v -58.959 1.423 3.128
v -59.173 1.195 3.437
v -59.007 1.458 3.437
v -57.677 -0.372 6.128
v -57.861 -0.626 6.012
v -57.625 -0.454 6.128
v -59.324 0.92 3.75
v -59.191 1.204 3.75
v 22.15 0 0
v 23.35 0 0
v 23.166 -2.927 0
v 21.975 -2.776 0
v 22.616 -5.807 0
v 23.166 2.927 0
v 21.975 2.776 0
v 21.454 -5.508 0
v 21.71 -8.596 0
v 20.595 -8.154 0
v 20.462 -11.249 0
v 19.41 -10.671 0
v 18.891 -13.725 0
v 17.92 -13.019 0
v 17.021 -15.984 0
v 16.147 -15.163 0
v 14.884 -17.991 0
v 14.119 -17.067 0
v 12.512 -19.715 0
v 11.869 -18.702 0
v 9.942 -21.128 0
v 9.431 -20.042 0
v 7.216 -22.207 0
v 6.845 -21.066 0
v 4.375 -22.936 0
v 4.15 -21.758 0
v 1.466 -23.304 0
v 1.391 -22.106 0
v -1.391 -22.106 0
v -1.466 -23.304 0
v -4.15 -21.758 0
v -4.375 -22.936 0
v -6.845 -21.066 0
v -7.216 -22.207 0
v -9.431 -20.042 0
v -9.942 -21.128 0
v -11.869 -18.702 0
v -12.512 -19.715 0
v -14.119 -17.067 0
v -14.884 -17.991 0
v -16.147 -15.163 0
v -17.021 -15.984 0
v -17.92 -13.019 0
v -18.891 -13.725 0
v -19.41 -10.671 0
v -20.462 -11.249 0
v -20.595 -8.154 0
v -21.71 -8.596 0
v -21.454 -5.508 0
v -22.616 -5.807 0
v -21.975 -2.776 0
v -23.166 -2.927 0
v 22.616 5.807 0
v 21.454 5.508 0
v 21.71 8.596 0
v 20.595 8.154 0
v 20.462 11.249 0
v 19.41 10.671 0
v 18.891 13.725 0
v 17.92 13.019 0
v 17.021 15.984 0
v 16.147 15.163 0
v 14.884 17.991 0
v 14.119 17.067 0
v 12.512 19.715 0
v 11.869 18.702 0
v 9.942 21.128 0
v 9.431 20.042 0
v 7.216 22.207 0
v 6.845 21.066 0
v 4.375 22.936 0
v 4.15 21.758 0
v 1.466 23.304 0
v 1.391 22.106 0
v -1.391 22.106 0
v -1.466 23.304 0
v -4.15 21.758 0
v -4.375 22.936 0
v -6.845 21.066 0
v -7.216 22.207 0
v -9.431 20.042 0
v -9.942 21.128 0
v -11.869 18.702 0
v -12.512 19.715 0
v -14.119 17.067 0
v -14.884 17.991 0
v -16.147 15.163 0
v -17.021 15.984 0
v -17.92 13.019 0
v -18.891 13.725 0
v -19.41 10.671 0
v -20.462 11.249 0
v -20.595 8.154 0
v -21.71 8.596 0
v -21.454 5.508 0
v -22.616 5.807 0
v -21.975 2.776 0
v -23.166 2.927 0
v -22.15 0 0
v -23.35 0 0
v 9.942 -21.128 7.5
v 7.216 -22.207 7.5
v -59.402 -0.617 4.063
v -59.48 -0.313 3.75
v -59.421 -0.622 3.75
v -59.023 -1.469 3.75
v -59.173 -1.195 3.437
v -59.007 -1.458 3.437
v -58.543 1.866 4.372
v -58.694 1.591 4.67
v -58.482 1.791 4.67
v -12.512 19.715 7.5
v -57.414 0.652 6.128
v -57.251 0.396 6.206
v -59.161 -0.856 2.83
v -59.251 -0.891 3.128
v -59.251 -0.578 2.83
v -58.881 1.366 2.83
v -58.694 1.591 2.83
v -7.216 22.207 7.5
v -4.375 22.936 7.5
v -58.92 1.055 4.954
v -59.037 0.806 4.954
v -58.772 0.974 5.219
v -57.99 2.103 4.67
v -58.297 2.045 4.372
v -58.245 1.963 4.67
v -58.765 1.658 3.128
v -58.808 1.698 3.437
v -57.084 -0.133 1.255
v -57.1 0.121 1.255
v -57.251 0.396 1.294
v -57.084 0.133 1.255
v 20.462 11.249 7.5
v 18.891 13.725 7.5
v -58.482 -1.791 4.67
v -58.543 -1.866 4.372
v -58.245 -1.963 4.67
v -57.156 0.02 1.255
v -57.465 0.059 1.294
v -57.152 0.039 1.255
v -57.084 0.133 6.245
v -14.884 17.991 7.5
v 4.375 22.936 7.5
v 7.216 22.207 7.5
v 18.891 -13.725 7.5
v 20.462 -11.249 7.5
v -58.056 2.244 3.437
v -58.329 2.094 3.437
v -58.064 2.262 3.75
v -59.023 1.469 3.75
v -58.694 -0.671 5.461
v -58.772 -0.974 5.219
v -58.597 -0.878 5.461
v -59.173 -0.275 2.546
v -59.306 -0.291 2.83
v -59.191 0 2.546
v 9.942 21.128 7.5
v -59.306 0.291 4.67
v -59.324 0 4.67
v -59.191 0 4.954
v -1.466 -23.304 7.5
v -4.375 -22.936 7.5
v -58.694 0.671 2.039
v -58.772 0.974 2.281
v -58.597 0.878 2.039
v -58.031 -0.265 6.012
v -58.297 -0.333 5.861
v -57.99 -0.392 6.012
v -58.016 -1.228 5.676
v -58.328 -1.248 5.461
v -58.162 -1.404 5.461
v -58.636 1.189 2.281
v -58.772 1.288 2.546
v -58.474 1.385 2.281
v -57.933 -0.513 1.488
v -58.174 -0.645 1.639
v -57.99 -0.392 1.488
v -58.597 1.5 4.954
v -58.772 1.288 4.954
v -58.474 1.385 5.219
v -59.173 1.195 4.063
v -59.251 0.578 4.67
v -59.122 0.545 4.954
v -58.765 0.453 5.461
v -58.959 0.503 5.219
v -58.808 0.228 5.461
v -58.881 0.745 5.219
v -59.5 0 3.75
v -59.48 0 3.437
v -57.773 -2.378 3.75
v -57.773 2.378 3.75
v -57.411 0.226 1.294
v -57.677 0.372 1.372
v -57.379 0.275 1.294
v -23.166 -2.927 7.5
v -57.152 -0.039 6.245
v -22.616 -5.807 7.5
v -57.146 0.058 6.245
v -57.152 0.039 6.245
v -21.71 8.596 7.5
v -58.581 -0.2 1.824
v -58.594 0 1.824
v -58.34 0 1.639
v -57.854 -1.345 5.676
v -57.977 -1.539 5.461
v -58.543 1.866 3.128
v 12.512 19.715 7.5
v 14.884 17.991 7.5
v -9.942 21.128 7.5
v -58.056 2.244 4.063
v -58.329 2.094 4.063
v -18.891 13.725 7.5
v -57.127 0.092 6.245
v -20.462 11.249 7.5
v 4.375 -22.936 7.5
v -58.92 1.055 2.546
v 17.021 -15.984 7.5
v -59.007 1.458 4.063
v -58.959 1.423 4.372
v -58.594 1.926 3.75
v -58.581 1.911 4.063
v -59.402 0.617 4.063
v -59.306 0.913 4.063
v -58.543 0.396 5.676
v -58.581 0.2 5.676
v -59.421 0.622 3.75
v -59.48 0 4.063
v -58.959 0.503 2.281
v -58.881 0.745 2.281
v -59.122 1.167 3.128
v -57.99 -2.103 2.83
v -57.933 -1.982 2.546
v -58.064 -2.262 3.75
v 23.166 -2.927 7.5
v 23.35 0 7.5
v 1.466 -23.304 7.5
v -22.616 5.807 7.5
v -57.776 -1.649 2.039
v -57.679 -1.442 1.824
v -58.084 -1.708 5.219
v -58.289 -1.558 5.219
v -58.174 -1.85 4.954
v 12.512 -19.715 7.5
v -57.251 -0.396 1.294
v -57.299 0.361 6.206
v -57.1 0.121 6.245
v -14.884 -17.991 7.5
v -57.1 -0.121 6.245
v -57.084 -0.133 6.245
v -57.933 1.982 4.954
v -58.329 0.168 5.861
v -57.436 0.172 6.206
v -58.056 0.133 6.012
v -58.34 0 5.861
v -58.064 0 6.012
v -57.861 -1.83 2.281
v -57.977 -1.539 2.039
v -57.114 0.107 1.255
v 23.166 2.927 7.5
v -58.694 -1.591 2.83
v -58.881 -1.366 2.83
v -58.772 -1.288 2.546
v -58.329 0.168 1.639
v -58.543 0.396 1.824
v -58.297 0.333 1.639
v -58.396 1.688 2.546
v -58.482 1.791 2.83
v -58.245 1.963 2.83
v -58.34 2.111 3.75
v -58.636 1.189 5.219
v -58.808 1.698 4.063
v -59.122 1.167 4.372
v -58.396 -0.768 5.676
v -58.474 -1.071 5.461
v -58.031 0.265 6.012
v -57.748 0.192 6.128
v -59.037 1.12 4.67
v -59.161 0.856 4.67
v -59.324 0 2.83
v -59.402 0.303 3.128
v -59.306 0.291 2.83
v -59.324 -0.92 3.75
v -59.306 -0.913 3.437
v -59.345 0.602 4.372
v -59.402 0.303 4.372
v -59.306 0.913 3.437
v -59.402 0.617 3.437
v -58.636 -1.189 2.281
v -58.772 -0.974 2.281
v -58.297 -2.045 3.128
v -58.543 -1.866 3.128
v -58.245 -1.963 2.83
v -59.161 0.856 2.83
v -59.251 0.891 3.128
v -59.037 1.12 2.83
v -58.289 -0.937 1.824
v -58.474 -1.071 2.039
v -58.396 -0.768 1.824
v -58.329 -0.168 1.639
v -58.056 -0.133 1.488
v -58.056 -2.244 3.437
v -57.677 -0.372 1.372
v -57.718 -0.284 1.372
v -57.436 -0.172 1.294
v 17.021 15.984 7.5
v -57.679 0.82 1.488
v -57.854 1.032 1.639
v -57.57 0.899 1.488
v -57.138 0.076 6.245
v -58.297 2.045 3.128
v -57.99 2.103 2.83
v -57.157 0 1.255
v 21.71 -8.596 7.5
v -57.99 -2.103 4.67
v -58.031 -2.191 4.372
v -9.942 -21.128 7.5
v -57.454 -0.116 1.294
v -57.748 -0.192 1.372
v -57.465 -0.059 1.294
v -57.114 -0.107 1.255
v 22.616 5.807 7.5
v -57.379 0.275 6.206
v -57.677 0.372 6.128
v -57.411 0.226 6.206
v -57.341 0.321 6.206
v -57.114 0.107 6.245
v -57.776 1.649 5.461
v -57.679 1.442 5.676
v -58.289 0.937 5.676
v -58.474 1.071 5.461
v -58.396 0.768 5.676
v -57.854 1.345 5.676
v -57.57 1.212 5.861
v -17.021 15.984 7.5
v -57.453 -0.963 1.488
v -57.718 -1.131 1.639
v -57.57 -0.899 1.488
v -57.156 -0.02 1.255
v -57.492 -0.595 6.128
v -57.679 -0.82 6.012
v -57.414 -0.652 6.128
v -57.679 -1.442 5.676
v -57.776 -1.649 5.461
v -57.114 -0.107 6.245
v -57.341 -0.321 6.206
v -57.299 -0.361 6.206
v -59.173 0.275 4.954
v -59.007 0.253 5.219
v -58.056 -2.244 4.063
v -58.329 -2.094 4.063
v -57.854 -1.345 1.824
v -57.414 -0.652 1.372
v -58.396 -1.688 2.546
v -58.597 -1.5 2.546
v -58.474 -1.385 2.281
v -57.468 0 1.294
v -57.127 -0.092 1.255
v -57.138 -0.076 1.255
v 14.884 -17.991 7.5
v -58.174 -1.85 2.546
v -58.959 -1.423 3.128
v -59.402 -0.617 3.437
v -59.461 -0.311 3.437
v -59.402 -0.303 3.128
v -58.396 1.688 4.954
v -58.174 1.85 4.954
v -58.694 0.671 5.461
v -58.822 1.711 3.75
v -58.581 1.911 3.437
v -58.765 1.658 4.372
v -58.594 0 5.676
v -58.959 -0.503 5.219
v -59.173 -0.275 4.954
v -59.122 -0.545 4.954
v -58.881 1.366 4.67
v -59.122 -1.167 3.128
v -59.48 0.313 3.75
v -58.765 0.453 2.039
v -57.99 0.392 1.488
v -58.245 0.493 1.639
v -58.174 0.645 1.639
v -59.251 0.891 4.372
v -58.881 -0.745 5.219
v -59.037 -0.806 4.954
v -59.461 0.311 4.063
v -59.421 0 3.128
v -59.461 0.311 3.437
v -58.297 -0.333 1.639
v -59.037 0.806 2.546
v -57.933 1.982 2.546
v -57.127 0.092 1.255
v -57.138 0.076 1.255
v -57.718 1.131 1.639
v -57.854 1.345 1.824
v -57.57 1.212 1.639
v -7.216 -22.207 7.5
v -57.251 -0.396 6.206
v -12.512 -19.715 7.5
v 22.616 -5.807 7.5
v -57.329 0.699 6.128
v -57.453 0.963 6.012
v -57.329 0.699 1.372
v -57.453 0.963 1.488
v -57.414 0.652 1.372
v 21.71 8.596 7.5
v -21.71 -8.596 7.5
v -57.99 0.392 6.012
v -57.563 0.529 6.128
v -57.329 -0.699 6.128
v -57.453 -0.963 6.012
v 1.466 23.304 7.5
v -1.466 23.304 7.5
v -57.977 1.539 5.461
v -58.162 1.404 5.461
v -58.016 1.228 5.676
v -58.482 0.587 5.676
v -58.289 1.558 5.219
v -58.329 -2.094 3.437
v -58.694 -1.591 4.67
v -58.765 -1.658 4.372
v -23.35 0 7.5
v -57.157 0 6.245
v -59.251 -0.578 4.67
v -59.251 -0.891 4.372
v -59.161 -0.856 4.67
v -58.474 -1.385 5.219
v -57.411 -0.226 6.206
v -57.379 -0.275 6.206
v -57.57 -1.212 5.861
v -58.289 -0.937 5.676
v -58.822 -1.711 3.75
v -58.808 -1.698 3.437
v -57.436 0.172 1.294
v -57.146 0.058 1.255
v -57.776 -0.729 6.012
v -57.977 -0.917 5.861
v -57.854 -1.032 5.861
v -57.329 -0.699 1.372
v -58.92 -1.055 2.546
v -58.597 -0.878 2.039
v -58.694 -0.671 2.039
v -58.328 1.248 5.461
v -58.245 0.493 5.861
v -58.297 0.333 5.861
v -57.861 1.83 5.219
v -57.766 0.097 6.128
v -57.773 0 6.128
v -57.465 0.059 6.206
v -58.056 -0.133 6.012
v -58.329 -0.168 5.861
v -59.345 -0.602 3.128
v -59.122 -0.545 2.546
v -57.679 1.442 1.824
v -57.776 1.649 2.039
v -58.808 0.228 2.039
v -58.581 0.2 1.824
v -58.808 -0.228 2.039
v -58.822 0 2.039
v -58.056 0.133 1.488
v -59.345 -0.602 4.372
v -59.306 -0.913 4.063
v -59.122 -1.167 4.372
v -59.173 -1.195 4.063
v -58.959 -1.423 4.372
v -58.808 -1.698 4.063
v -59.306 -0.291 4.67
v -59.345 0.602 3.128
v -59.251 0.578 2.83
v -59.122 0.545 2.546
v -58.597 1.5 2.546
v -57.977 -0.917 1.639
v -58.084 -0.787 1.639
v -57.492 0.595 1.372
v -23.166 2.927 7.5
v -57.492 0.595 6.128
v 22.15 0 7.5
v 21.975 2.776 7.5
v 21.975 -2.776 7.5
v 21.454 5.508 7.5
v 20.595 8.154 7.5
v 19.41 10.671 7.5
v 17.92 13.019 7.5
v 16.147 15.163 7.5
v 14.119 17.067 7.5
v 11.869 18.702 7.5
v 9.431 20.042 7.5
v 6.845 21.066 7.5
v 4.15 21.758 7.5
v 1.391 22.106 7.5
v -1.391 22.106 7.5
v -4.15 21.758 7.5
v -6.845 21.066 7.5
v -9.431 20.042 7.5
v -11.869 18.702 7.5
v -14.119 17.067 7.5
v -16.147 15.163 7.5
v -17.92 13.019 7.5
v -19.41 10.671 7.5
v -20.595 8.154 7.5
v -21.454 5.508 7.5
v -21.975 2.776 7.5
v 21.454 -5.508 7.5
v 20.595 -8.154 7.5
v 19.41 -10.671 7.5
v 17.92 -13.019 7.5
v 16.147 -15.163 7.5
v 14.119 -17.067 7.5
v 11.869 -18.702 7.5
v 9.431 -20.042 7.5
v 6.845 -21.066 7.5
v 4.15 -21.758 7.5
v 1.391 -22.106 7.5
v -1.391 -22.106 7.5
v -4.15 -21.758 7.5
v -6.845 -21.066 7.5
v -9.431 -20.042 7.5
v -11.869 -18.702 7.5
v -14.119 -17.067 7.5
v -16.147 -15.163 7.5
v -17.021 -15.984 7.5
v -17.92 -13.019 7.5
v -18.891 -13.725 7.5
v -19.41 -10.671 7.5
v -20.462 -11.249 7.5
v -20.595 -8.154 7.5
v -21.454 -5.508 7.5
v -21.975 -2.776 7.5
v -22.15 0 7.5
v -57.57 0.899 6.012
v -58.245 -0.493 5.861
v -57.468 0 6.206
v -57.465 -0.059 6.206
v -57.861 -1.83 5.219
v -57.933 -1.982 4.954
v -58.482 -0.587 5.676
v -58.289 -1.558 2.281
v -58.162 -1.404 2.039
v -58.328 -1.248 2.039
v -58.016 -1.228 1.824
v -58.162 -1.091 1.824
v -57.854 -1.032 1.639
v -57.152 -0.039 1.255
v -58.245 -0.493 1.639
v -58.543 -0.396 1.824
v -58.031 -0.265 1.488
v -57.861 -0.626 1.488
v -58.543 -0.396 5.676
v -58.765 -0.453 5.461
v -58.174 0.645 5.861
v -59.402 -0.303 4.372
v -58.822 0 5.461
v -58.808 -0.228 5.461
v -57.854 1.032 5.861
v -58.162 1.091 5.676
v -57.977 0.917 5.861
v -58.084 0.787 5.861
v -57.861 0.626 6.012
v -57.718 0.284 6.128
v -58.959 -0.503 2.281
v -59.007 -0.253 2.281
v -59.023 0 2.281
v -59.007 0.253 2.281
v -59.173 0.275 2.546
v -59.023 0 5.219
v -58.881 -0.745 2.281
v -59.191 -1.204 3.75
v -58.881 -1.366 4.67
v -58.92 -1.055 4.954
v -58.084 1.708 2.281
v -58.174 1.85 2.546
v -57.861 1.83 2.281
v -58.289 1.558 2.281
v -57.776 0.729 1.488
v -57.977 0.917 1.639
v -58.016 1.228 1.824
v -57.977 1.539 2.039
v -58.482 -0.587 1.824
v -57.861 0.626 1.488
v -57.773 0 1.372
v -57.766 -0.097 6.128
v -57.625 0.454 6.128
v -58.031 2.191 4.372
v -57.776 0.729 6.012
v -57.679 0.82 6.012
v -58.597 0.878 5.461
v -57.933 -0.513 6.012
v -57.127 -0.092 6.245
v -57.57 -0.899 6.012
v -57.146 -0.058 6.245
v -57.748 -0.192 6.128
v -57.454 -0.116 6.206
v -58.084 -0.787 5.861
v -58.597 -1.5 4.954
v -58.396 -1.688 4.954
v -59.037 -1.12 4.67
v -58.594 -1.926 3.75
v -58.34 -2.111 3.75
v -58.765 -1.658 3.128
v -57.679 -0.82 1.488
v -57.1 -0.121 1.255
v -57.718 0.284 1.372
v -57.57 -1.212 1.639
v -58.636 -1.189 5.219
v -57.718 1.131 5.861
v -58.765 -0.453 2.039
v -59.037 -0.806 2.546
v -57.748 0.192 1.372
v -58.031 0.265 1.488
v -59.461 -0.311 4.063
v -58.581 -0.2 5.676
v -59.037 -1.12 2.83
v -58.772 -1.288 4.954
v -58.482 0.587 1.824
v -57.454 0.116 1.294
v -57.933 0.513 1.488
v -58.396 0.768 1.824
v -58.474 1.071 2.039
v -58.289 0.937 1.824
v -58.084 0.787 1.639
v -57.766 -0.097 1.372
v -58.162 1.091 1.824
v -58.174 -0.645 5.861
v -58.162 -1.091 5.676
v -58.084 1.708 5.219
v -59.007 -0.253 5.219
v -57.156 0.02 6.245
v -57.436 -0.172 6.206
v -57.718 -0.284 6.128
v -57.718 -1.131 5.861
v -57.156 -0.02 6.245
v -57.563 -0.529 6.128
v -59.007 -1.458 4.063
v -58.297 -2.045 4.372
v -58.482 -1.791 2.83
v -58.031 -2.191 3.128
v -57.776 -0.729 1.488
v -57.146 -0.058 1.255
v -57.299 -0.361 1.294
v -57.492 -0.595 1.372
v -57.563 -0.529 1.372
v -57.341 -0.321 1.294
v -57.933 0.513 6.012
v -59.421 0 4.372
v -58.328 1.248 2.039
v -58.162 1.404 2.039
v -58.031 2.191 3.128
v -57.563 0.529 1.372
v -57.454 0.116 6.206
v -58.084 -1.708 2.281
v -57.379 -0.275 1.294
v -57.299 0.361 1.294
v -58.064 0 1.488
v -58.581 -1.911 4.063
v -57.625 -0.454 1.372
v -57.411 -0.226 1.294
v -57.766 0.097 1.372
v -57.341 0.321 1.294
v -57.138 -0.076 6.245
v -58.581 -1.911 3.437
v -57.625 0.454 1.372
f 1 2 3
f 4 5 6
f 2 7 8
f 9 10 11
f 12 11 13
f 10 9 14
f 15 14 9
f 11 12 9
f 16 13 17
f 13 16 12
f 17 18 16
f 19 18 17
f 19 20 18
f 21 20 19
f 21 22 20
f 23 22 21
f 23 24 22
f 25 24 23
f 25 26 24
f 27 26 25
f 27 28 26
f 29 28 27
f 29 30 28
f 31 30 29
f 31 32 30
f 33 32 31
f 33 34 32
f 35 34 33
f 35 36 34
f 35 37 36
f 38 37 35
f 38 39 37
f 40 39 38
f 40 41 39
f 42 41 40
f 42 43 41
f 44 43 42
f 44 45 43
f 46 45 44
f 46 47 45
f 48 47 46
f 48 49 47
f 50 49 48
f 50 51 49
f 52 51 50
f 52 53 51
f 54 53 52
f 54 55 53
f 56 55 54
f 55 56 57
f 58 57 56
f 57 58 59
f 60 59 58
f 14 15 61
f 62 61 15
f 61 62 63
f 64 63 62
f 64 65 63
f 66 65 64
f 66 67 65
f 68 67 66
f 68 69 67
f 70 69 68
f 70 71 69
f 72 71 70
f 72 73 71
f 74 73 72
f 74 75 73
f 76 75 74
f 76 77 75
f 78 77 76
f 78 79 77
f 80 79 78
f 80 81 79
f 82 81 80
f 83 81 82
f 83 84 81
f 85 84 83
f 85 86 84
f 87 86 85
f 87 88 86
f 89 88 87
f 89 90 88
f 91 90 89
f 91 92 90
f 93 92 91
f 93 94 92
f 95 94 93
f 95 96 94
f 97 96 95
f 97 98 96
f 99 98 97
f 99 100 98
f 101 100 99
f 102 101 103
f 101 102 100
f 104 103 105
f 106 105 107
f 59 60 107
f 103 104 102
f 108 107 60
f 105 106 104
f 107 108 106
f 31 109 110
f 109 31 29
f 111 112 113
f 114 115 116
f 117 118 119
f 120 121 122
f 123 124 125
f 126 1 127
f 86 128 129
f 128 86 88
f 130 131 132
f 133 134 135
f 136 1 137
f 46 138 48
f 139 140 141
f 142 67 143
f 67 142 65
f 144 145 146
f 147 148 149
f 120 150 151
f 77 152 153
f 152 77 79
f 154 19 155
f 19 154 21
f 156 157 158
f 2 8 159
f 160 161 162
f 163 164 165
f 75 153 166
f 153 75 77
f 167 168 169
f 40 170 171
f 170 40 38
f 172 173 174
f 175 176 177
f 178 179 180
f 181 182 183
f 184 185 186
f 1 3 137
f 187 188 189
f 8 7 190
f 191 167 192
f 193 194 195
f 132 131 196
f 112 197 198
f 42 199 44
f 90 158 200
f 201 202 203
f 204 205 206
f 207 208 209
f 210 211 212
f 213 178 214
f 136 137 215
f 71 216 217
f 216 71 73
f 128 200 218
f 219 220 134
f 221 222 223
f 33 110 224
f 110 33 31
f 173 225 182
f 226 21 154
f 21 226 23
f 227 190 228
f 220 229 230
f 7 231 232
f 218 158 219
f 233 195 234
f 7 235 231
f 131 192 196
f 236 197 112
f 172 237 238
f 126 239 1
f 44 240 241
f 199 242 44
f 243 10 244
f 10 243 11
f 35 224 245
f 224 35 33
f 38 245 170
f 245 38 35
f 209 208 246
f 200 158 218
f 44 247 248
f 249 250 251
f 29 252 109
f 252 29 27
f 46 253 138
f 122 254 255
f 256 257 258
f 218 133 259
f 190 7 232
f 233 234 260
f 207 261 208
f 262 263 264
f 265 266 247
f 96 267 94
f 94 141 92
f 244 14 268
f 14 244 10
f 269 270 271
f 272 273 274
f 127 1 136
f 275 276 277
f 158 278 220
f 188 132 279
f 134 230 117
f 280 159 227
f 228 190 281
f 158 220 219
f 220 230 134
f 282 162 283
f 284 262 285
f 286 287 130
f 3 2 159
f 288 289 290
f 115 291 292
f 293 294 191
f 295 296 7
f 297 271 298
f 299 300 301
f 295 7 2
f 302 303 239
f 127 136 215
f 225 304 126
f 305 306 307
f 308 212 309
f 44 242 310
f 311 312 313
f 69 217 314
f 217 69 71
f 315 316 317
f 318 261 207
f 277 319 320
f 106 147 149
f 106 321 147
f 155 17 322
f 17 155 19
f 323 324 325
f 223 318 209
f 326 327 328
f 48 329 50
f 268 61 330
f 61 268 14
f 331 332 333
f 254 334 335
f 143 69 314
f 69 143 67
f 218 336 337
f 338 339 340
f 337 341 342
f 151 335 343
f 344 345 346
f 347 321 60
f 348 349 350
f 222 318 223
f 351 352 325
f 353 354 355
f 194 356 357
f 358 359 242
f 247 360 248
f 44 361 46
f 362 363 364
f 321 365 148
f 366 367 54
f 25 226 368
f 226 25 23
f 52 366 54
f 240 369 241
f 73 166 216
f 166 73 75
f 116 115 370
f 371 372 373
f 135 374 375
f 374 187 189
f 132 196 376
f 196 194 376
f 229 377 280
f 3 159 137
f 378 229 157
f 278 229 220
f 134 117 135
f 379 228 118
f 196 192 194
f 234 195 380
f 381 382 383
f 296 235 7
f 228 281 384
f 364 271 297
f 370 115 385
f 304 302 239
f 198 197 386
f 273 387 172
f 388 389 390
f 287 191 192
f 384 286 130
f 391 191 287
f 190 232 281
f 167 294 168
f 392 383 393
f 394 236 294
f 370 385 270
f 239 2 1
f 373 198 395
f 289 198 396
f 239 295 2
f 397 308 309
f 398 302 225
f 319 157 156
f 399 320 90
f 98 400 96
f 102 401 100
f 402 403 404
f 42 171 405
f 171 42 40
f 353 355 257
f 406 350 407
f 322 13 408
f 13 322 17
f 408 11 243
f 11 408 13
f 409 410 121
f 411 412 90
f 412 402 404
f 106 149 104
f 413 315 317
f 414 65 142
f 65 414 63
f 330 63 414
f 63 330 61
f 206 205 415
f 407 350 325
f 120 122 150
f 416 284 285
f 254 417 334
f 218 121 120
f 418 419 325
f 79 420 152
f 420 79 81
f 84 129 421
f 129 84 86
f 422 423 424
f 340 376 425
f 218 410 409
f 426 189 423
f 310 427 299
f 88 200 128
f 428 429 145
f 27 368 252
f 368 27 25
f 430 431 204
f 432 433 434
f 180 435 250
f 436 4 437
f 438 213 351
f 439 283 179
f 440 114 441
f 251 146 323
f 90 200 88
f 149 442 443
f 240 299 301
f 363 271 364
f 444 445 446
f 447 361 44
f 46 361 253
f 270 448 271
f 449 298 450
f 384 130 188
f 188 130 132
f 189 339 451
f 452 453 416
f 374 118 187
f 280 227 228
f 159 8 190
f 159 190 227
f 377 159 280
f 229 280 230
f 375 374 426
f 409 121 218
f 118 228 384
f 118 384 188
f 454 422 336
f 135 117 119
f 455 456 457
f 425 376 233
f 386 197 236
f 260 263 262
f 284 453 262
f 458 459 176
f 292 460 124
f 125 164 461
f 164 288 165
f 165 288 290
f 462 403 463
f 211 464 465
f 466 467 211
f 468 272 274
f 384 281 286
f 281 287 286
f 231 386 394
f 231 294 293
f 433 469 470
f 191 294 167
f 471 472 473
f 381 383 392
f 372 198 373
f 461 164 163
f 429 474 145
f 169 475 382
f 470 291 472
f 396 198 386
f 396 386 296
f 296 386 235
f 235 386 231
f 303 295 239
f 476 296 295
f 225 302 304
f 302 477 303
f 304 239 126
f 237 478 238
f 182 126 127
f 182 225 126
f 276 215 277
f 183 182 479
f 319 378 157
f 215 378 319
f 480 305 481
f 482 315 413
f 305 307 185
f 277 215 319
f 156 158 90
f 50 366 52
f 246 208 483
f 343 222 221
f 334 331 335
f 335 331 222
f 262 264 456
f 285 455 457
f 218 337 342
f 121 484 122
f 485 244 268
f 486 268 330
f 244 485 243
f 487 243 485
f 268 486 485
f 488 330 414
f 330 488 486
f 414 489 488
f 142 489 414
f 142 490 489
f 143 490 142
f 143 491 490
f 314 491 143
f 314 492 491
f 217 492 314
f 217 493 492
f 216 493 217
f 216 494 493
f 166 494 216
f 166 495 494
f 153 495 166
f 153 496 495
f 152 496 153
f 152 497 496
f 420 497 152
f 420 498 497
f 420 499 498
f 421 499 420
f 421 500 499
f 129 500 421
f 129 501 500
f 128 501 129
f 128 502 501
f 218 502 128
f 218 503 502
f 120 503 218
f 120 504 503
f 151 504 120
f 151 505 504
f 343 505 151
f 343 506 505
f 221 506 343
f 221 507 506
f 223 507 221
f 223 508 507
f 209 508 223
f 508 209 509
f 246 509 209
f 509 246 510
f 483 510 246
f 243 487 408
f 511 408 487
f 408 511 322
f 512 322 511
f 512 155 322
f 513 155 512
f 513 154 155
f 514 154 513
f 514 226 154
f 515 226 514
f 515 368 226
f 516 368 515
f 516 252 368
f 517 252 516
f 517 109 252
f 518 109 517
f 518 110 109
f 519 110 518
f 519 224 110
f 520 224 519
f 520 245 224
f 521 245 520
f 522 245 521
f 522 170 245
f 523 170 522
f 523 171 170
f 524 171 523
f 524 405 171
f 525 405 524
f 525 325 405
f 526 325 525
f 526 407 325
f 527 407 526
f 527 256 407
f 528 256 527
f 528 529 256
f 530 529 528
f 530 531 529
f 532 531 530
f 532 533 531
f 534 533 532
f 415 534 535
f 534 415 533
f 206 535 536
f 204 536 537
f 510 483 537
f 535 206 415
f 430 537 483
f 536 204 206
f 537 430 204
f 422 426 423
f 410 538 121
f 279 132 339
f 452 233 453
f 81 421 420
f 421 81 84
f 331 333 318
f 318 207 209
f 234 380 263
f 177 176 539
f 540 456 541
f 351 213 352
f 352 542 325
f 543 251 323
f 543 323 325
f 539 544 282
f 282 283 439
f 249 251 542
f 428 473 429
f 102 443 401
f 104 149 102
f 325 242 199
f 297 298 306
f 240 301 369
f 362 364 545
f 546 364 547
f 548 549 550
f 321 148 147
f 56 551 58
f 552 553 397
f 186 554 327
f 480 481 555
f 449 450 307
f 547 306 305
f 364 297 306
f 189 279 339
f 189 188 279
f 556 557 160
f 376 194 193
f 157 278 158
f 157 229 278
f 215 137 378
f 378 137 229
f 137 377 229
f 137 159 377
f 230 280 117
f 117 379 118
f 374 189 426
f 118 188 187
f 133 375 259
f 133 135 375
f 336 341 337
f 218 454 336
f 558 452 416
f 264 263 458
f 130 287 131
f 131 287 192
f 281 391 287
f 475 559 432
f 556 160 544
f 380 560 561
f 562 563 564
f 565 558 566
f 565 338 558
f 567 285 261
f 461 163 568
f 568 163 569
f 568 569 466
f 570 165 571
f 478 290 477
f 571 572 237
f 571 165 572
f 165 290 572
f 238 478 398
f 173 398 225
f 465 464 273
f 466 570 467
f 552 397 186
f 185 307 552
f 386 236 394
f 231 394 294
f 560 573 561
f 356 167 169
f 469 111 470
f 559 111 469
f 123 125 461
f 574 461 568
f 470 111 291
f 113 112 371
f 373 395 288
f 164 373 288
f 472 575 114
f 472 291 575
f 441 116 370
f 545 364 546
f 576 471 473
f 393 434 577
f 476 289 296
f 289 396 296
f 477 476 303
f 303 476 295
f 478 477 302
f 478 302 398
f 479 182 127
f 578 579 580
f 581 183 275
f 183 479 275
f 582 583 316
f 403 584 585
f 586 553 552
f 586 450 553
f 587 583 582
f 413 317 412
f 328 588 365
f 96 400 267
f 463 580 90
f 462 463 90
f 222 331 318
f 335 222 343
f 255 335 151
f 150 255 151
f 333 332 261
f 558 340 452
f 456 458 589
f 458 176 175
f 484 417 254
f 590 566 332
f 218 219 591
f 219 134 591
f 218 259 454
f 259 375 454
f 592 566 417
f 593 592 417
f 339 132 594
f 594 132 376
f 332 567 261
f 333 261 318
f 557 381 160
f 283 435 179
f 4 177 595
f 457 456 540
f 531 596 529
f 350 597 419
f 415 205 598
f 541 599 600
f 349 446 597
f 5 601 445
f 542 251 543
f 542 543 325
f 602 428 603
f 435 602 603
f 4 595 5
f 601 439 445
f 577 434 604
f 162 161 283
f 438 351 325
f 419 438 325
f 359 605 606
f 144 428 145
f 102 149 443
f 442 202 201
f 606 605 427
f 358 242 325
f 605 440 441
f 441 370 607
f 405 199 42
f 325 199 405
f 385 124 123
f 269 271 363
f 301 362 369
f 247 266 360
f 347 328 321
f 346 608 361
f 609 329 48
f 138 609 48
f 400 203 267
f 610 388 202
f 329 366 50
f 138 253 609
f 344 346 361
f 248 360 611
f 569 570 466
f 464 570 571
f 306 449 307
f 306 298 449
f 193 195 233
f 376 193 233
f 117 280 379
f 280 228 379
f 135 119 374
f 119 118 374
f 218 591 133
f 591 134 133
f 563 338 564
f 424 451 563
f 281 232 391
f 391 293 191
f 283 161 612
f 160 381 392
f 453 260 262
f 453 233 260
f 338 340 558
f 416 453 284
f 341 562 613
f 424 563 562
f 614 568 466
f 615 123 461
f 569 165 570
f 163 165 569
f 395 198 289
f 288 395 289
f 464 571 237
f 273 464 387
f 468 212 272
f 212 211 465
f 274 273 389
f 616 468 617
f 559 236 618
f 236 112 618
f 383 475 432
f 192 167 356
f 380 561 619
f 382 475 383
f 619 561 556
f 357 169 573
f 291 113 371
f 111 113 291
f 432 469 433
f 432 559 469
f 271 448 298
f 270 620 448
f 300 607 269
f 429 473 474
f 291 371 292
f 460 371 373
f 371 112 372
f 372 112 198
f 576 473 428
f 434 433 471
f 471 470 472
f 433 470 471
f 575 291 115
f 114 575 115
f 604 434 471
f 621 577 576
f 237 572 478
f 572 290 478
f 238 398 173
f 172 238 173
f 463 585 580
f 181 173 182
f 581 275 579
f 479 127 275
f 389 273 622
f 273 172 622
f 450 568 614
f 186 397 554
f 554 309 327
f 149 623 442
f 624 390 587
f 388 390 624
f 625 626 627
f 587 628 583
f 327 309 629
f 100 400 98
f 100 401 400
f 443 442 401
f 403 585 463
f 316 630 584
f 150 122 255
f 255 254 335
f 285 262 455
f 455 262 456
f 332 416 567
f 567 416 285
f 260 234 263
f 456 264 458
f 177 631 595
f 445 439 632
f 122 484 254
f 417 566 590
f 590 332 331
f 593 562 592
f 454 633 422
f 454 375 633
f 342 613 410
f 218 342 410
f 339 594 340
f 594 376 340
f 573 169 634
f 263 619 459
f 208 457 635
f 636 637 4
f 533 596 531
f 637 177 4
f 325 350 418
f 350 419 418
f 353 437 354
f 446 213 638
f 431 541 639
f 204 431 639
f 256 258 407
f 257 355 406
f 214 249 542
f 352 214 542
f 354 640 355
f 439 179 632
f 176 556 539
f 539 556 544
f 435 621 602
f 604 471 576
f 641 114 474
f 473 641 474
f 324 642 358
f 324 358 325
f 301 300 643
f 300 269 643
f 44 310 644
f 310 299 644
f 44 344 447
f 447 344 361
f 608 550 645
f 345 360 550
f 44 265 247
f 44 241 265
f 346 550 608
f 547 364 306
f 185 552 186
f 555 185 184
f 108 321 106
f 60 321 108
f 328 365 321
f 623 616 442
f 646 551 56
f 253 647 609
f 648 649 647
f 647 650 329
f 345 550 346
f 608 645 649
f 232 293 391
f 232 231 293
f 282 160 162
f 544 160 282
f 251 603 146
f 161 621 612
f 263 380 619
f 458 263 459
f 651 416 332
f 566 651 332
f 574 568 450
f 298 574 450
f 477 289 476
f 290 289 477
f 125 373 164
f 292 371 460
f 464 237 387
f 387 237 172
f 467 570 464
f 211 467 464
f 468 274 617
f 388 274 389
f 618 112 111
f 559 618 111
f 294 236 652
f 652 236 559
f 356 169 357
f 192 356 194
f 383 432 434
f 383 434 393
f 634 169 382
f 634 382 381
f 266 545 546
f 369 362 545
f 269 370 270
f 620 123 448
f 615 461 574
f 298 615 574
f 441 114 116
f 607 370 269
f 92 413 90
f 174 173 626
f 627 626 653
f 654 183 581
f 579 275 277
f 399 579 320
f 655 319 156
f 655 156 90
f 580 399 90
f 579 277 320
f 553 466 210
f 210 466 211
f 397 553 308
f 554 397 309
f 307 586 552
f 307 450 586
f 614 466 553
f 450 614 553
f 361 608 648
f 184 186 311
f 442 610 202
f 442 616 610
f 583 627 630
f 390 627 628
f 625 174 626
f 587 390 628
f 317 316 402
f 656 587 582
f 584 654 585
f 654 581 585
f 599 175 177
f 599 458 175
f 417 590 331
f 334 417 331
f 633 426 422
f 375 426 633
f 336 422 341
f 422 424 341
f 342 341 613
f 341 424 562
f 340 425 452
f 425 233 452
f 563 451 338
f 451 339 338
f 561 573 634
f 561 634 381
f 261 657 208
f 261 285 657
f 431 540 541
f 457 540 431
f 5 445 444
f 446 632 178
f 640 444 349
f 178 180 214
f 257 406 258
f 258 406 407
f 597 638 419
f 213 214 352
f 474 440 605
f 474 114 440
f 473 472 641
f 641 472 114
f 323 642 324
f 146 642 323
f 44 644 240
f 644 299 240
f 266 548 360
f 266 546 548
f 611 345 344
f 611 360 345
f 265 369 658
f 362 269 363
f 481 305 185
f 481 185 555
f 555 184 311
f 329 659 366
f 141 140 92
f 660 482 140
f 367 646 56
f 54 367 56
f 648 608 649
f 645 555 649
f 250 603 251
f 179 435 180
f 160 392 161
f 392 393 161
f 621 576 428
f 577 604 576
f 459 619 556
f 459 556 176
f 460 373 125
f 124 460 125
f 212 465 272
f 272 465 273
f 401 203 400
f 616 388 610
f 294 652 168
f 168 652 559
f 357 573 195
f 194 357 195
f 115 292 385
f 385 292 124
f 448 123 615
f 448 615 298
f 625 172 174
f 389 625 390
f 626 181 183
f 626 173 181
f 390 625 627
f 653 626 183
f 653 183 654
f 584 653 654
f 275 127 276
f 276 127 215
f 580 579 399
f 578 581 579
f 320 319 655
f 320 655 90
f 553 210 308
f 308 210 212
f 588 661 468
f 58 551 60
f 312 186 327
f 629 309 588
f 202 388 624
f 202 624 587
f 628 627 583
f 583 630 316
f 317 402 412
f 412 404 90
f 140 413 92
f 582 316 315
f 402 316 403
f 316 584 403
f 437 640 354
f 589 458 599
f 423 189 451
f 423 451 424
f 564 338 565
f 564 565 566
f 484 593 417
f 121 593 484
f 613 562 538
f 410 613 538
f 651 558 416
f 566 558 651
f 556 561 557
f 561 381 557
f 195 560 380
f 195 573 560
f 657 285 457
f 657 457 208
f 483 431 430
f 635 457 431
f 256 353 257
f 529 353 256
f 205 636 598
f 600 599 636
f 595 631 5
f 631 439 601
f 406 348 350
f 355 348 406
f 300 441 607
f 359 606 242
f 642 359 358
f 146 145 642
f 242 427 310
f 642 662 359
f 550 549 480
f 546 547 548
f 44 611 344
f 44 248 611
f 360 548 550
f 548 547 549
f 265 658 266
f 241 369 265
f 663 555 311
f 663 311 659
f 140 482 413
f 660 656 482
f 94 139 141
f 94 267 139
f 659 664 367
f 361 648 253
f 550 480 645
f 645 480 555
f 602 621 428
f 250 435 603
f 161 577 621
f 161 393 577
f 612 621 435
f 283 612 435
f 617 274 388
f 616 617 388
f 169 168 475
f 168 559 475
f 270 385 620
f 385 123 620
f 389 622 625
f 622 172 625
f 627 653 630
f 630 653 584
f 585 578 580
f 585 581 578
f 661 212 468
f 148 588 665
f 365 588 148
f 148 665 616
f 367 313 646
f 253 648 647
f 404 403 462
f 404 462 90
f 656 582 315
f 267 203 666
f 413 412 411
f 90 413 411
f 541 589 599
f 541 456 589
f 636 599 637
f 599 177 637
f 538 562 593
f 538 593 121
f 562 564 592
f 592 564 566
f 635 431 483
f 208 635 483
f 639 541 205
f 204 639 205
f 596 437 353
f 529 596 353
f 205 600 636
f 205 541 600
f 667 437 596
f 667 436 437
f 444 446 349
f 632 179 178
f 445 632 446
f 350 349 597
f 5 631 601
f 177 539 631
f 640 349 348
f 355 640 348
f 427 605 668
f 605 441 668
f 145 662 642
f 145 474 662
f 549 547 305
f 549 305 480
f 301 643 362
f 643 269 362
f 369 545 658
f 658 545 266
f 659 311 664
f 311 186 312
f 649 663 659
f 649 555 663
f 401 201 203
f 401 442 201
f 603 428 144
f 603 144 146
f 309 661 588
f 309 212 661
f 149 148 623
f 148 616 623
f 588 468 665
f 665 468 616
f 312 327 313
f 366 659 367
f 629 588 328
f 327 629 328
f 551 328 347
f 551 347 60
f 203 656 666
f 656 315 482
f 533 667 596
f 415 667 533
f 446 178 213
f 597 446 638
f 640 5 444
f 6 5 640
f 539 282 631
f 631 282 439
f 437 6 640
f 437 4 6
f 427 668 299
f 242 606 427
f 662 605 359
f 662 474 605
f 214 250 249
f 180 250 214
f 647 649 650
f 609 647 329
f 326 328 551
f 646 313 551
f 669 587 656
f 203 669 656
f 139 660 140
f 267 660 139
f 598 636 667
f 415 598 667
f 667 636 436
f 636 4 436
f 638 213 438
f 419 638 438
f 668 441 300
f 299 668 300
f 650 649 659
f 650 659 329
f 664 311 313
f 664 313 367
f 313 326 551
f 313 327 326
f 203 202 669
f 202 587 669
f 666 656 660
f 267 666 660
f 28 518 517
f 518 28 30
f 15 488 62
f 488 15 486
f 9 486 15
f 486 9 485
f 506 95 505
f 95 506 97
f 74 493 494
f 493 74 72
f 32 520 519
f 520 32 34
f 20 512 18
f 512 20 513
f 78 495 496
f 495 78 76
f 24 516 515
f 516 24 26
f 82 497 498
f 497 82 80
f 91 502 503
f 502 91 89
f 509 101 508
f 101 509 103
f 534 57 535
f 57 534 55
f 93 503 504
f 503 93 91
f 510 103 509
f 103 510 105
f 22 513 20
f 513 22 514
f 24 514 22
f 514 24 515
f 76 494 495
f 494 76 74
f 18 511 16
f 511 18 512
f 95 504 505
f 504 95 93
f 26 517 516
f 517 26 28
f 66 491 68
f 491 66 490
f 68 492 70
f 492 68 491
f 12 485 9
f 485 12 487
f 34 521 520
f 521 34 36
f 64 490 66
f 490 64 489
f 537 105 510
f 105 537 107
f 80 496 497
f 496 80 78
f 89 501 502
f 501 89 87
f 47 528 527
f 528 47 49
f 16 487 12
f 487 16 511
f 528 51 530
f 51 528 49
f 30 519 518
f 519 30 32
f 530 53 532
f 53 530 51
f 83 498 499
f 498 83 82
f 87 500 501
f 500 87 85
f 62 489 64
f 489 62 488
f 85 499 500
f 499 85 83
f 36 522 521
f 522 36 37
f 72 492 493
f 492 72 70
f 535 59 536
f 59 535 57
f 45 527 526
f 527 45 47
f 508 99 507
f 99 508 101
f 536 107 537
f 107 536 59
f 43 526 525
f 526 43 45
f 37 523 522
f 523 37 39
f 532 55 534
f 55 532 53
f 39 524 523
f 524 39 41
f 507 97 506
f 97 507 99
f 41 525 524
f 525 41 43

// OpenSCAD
$fn=50;

difference()
{
	hull()
	{
		cylinder(h=7.5, d=44 + 0.3 + 1.2 * 2);
		translate([-57,0,7.5/2]) sphere(d=5);
	}
	translate([0,0,-0.1]) cylinder(h=7.5 + 0.2, d=44 + 0.3);
}
